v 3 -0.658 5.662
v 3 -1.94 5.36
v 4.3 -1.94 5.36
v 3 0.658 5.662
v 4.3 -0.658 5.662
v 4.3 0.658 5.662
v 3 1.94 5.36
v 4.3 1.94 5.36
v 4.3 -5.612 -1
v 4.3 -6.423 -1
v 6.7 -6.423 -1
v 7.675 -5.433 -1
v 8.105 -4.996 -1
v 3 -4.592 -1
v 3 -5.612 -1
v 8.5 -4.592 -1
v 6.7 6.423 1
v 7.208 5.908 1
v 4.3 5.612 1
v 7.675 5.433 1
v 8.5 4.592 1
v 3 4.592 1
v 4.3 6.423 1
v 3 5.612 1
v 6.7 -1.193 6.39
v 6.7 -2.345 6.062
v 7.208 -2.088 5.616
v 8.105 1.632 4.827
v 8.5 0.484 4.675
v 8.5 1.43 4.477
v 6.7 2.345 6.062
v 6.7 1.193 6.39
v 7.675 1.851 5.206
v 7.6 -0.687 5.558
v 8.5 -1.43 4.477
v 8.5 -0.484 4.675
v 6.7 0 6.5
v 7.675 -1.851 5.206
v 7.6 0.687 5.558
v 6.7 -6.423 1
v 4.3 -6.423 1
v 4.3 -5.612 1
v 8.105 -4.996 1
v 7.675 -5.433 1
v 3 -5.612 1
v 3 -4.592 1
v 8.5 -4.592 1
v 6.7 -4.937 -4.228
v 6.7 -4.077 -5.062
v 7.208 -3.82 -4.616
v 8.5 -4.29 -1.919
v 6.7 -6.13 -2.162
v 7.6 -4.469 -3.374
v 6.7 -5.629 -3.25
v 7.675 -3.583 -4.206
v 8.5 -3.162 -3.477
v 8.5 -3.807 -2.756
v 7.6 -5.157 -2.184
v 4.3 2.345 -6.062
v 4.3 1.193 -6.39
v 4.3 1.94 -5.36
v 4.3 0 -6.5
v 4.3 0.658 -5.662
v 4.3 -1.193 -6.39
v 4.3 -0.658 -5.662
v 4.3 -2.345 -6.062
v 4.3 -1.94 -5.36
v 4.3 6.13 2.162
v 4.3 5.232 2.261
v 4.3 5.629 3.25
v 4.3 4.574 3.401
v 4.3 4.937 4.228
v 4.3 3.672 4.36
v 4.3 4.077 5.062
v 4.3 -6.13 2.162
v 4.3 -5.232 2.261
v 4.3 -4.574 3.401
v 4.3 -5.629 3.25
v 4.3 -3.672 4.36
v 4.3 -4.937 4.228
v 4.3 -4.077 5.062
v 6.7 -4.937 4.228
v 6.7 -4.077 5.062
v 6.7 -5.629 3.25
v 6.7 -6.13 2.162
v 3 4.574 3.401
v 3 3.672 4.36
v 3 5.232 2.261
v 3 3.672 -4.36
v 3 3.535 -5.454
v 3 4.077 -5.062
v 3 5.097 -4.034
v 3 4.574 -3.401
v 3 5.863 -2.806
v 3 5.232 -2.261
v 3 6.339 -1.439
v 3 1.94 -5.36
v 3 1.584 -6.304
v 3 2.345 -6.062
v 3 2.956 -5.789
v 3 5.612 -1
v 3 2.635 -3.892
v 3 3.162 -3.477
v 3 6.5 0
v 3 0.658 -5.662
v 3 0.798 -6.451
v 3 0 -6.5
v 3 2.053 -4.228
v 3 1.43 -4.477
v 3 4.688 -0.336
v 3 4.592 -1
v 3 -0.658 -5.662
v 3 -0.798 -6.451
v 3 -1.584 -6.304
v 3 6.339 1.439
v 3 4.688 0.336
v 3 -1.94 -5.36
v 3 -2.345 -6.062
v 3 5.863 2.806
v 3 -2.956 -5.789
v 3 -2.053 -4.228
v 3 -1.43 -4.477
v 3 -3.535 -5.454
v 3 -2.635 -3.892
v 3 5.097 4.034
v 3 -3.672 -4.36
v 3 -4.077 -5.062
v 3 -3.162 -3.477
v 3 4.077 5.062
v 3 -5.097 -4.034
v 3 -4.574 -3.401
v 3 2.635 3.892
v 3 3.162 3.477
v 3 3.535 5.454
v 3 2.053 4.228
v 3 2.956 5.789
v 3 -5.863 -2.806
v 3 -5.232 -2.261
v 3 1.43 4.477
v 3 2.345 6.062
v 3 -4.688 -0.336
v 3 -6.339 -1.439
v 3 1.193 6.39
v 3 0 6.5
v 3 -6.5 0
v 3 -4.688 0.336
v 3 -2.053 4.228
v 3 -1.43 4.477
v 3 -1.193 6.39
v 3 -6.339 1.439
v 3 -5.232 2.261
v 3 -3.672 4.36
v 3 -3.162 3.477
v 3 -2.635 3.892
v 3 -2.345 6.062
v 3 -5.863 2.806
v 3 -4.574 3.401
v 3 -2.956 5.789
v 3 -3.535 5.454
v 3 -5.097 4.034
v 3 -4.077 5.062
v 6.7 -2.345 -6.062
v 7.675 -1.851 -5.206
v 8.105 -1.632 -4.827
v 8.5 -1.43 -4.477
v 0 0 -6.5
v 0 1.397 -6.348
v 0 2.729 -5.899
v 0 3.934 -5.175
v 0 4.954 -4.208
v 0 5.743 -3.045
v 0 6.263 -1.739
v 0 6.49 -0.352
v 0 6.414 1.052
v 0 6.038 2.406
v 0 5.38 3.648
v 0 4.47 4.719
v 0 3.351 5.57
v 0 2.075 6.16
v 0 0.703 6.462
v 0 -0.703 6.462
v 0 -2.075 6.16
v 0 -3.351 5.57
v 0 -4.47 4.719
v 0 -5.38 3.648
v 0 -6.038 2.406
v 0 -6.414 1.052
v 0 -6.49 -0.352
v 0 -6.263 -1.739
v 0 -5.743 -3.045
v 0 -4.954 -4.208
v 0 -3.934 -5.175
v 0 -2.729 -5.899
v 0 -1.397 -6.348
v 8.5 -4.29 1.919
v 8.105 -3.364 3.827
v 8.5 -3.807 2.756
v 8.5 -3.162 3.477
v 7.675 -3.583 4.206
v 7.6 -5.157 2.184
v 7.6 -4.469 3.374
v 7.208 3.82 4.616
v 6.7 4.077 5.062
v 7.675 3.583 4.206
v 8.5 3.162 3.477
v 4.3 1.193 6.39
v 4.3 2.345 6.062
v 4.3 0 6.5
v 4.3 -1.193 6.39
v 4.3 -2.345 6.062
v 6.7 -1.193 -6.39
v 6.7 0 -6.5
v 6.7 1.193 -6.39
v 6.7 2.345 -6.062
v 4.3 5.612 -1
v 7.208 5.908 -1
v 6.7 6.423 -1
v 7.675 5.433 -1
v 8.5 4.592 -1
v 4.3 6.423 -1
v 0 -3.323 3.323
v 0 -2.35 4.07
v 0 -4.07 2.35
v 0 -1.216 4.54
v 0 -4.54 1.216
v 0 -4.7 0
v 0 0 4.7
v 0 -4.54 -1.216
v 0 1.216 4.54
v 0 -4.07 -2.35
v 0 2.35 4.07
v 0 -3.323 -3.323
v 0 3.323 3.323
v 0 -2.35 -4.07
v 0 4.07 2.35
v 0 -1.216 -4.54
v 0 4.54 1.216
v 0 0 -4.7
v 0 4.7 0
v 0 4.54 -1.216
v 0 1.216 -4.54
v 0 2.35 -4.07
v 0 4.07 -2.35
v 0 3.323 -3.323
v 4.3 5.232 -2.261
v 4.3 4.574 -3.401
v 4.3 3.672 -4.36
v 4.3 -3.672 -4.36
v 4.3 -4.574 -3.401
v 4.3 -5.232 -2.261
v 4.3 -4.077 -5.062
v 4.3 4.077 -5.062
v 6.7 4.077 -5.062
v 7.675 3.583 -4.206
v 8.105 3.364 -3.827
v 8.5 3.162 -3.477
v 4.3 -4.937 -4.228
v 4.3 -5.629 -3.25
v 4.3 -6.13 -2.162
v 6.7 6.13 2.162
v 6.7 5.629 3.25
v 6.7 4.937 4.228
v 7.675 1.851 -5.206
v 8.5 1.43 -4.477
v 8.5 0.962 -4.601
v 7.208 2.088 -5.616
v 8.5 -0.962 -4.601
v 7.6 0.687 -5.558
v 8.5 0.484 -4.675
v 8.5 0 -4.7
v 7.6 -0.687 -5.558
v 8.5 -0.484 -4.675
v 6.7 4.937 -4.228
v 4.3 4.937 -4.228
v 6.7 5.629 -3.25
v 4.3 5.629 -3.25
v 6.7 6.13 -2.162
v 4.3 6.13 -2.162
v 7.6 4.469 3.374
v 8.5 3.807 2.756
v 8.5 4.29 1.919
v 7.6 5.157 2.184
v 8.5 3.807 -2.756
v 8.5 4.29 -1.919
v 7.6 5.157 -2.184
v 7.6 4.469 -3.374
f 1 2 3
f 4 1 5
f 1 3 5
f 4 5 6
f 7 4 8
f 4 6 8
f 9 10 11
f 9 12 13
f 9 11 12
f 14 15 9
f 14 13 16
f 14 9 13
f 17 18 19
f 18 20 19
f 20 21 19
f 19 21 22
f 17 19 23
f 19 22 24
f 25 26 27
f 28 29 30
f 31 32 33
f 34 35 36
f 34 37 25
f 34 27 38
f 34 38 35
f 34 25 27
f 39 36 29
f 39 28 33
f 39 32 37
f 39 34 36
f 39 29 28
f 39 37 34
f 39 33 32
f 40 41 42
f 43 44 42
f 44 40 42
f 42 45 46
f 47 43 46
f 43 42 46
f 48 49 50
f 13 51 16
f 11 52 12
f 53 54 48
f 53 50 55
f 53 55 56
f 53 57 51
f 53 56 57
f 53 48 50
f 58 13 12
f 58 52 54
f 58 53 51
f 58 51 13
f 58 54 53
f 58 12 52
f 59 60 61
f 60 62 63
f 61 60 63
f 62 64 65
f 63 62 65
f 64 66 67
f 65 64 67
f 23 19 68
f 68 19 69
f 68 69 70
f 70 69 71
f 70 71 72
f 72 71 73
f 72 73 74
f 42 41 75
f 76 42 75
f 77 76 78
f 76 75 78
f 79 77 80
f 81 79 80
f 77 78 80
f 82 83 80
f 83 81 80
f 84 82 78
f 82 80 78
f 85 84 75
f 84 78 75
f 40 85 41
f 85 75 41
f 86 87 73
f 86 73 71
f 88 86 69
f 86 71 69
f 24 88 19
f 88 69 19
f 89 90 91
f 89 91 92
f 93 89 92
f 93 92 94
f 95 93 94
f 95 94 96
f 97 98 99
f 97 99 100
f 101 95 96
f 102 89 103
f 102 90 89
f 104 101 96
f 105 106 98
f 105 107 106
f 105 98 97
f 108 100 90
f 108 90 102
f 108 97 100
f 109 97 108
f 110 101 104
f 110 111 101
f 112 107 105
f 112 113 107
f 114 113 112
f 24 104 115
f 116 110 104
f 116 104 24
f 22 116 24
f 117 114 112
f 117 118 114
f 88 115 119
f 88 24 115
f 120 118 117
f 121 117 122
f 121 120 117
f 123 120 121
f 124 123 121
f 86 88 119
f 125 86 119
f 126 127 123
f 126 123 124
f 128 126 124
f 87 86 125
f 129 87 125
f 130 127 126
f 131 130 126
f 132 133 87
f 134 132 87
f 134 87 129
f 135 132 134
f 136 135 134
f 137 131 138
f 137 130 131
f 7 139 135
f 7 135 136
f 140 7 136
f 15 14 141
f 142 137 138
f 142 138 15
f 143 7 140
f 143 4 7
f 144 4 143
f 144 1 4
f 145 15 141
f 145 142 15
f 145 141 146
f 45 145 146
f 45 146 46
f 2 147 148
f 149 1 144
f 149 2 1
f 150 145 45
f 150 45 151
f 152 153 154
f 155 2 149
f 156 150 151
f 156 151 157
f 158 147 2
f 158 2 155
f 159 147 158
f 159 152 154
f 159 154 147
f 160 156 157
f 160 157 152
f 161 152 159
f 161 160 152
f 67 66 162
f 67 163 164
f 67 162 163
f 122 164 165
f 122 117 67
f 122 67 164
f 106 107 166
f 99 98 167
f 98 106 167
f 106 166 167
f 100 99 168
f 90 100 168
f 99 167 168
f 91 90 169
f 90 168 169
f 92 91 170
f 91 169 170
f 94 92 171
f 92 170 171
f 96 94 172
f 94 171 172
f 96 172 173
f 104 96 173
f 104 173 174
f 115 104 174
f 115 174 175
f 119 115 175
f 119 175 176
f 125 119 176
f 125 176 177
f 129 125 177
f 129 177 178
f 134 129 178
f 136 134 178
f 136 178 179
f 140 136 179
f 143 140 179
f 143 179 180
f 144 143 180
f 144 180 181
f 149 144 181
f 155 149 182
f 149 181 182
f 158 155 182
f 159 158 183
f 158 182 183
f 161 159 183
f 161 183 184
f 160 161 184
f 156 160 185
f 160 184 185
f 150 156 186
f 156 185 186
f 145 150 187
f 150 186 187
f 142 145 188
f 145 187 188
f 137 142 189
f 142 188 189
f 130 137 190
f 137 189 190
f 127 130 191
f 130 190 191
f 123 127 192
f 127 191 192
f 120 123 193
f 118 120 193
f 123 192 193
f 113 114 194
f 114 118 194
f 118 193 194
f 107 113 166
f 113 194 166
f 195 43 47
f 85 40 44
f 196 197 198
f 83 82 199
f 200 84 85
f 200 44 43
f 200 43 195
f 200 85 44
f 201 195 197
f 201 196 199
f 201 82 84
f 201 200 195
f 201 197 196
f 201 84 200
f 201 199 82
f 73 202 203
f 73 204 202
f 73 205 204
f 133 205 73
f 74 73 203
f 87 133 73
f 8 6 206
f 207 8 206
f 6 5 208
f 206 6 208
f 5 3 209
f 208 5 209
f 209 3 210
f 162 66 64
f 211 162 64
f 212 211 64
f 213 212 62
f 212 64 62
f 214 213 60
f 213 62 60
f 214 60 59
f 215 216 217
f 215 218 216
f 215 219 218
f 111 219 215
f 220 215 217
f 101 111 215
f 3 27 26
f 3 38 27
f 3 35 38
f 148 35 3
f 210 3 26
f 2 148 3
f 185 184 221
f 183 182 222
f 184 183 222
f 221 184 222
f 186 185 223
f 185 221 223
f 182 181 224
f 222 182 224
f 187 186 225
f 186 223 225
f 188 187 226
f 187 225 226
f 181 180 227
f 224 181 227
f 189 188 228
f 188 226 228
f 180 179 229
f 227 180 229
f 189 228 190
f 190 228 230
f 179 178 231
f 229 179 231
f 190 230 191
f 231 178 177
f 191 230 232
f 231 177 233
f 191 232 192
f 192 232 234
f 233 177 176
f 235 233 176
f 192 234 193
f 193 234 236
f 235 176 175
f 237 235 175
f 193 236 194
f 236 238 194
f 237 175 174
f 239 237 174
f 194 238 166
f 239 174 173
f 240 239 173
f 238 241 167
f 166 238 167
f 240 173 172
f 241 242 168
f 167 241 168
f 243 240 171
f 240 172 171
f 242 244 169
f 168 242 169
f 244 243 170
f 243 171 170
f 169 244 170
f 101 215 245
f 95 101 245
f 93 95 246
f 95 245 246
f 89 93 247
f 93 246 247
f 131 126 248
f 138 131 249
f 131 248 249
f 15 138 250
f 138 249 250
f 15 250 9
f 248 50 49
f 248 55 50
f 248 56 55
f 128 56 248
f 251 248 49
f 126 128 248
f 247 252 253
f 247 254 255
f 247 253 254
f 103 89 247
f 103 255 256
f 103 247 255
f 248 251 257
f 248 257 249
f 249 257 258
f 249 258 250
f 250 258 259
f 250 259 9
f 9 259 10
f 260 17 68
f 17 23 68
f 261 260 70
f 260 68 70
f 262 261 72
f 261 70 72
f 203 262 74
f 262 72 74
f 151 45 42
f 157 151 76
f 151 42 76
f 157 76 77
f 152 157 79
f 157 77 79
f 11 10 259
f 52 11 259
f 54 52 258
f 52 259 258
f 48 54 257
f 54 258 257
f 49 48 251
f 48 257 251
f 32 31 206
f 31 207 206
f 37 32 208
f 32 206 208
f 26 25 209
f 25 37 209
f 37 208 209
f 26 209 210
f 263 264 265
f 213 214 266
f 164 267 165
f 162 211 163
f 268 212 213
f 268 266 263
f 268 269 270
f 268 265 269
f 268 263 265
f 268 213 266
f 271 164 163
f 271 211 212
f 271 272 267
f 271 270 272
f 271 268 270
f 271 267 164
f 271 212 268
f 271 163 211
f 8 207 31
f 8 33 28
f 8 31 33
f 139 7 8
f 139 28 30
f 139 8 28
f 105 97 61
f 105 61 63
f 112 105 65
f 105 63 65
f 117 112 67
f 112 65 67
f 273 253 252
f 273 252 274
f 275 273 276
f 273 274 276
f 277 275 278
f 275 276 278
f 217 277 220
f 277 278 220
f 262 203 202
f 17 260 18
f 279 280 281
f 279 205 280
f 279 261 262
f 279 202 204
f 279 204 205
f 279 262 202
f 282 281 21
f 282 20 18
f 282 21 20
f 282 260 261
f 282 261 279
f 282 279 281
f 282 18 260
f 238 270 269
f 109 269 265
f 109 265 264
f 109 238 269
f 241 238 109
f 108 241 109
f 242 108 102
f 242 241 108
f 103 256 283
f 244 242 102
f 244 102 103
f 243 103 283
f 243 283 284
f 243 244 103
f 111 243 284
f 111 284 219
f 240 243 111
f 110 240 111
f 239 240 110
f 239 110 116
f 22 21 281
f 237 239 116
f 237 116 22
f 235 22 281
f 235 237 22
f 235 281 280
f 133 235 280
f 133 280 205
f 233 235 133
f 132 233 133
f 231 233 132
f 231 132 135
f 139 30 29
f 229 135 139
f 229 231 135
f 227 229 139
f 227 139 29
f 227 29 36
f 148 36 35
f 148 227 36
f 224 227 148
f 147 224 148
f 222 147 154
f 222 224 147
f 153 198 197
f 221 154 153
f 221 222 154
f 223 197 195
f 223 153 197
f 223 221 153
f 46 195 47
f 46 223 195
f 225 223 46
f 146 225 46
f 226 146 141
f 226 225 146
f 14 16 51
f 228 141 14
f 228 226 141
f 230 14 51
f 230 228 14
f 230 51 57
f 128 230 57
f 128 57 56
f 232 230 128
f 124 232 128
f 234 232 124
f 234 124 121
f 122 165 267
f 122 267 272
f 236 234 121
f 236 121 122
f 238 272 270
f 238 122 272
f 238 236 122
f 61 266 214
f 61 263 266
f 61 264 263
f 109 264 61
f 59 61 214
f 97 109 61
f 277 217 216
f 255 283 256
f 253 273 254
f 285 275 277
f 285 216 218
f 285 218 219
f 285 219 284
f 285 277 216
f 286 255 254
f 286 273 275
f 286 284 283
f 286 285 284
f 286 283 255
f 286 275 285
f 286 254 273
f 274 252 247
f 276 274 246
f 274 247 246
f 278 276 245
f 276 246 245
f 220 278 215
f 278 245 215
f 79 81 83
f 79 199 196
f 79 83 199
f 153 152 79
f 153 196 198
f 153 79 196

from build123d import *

# Parameters (mm, degrees)
SKETCH_1_R               = 6.5
SKETCH_1_R_2             = 4.7
EXTRUDE_1_DEPTH          = 8.5
SKETCH_2_W               = 1.3
SKETCH_2_H               = 0.8
SKETCH_4_W               = 2
SKETCH_4_H               = 13
CUT_EXTRUDE_1_DEPTH      = 8.5
PATTERN_START            = 3
PATTERN_CIRCULAR_1_DEPTH = 5.5000001


# Read off the part's stored shape, not the designer's step: Круговой массив1
with BuildPart() as part:
    # Эскиз1 → Вытянуть1 (new body)
    with BuildSketch(Plane(origin=(0, 0, 0), x_dir=(0, 0, -1), z_dir=(1, 0, 0))):
        Circle(SKETCH_1_R)
        Circle(SKETCH_1_R_2, mode=Mode.SUBTRACT)
    extrude(amount=EXTRUDE_1_DEPTH)

    # Эскиз2 → Вырез-Повернуть1 (revolve, cut)
    with BuildSketch(Plane.XY, mode=Mode.PRIVATE) as cut_revolve_1_sk:
        with Locations((3.65, 6.1)):
            Rectangle(SKETCH_2_W, SKETCH_2_H)
    revolve(cut_revolve_1_sk.sketch.rotate(Axis((8.5, 0, 0), (-1, 0, 0)), 90), axis=Axis((8.5, 0, 0), (-1, 0, 0)), mode=Mode.SUBTRACT)

    # Эскиз3 → Вырез-Повернуть2 (revolve, cut)
    with BuildSketch(Plane.XY, mode=Mode.PRIVATE) as cut_revolve_2_sk:
        Polygon((8.5, 4.7), (6.7, 6.5), (8.5, 6.5), align=None)
    revolve(cut_revolve_2_sk.sketch.rotate(Axis((8.5, 0, 0), (-1, 0, 0)), 90), axis=Axis((8.5, 0, 0), (-1, 0, 0)), mode=Mode.SUBTRACT)

    # Эскиз4 → Вырез-Вытянуть1 (cut)
    with BuildSketch(Plane(origin=(3, 0, 0), x_dir=(0, 0, -1), z_dir=(1, 0, 0))):
        Rectangle(SKETCH_4_W, SKETCH_4_H)
    extrude(amount=CUT_EXTRUDE_1_DEPTH, mode=Mode.SUBTRACT)

    # Круговой массив1 outline → Круговой массив1 (cut)
    with BuildSketch(Plane.YZ.offset(PATTERN_START)):
        with BuildLine():
            ThreePointArc((3.162217904, -3.477122075), (2.35, -4.070319398), (1.430167097, -4.477122075))
            Line((1.430167097, -4.477122075), (2.345282741, -6.062148865))
            ThreePointArc((2.345282741, -6.062148865), (3.25, -5.629165125), (4.077333548, -5.062148865))
            Line((4.077333548, -5.062148865), (3.162217904, -3.477122075))
        make_face()
        with BuildLine():
            ThreePointArc((-1.430167097, -4.477122075), (-2.35, -4.070319398), (-3.162217904, -3.477122075))
            Line((-3.162217904, -3.477122075), (-4.077333548, -5.062148865))
            ThreePointArc((-4.077333548, -5.062148865), (-3.25, -5.629165125), (-2.345282741, -6.062148865))
            Line((-2.345282741, -6.062148865), (-1.430167097, -4.477122075))
        make_face()
        with BuildLine():
            ThreePointArc((1.430167097, 4.477122075), (2.35, 4.070319398), (3.162217904, 3.477122075))
            Line((3.162217904, 3.477122075), (4.077333548, 5.062148865))
            ThreePointArc((4.077333548, 5.062148865), (3.25, 5.629165125), (2.345282741, 6.062148865))
            Line((2.345282741, 6.062148865), (1.430167097, 4.477122075))
        make_face()
        with BuildLine():
            ThreePointArc((-3.162217904, 3.477122075), (-2.35, 4.070319398), (-1.430167097, 4.477122075))
            Line((-1.430167097, 4.477122075), (-2.345282741, 6.062148865))
            ThreePointArc((-2.345282741, 6.062148865), (-3.25, 5.629165125), (-4.077333548, 5.062148865))
            Line((-4.077333548, 5.062148865), (-3.162217904, 3.477122075))
        make_face()
    extrude(amount=PATTERN_CIRCULAR_1_DEPTH, mode=Mode.SUBTRACT)


solid = part.part
